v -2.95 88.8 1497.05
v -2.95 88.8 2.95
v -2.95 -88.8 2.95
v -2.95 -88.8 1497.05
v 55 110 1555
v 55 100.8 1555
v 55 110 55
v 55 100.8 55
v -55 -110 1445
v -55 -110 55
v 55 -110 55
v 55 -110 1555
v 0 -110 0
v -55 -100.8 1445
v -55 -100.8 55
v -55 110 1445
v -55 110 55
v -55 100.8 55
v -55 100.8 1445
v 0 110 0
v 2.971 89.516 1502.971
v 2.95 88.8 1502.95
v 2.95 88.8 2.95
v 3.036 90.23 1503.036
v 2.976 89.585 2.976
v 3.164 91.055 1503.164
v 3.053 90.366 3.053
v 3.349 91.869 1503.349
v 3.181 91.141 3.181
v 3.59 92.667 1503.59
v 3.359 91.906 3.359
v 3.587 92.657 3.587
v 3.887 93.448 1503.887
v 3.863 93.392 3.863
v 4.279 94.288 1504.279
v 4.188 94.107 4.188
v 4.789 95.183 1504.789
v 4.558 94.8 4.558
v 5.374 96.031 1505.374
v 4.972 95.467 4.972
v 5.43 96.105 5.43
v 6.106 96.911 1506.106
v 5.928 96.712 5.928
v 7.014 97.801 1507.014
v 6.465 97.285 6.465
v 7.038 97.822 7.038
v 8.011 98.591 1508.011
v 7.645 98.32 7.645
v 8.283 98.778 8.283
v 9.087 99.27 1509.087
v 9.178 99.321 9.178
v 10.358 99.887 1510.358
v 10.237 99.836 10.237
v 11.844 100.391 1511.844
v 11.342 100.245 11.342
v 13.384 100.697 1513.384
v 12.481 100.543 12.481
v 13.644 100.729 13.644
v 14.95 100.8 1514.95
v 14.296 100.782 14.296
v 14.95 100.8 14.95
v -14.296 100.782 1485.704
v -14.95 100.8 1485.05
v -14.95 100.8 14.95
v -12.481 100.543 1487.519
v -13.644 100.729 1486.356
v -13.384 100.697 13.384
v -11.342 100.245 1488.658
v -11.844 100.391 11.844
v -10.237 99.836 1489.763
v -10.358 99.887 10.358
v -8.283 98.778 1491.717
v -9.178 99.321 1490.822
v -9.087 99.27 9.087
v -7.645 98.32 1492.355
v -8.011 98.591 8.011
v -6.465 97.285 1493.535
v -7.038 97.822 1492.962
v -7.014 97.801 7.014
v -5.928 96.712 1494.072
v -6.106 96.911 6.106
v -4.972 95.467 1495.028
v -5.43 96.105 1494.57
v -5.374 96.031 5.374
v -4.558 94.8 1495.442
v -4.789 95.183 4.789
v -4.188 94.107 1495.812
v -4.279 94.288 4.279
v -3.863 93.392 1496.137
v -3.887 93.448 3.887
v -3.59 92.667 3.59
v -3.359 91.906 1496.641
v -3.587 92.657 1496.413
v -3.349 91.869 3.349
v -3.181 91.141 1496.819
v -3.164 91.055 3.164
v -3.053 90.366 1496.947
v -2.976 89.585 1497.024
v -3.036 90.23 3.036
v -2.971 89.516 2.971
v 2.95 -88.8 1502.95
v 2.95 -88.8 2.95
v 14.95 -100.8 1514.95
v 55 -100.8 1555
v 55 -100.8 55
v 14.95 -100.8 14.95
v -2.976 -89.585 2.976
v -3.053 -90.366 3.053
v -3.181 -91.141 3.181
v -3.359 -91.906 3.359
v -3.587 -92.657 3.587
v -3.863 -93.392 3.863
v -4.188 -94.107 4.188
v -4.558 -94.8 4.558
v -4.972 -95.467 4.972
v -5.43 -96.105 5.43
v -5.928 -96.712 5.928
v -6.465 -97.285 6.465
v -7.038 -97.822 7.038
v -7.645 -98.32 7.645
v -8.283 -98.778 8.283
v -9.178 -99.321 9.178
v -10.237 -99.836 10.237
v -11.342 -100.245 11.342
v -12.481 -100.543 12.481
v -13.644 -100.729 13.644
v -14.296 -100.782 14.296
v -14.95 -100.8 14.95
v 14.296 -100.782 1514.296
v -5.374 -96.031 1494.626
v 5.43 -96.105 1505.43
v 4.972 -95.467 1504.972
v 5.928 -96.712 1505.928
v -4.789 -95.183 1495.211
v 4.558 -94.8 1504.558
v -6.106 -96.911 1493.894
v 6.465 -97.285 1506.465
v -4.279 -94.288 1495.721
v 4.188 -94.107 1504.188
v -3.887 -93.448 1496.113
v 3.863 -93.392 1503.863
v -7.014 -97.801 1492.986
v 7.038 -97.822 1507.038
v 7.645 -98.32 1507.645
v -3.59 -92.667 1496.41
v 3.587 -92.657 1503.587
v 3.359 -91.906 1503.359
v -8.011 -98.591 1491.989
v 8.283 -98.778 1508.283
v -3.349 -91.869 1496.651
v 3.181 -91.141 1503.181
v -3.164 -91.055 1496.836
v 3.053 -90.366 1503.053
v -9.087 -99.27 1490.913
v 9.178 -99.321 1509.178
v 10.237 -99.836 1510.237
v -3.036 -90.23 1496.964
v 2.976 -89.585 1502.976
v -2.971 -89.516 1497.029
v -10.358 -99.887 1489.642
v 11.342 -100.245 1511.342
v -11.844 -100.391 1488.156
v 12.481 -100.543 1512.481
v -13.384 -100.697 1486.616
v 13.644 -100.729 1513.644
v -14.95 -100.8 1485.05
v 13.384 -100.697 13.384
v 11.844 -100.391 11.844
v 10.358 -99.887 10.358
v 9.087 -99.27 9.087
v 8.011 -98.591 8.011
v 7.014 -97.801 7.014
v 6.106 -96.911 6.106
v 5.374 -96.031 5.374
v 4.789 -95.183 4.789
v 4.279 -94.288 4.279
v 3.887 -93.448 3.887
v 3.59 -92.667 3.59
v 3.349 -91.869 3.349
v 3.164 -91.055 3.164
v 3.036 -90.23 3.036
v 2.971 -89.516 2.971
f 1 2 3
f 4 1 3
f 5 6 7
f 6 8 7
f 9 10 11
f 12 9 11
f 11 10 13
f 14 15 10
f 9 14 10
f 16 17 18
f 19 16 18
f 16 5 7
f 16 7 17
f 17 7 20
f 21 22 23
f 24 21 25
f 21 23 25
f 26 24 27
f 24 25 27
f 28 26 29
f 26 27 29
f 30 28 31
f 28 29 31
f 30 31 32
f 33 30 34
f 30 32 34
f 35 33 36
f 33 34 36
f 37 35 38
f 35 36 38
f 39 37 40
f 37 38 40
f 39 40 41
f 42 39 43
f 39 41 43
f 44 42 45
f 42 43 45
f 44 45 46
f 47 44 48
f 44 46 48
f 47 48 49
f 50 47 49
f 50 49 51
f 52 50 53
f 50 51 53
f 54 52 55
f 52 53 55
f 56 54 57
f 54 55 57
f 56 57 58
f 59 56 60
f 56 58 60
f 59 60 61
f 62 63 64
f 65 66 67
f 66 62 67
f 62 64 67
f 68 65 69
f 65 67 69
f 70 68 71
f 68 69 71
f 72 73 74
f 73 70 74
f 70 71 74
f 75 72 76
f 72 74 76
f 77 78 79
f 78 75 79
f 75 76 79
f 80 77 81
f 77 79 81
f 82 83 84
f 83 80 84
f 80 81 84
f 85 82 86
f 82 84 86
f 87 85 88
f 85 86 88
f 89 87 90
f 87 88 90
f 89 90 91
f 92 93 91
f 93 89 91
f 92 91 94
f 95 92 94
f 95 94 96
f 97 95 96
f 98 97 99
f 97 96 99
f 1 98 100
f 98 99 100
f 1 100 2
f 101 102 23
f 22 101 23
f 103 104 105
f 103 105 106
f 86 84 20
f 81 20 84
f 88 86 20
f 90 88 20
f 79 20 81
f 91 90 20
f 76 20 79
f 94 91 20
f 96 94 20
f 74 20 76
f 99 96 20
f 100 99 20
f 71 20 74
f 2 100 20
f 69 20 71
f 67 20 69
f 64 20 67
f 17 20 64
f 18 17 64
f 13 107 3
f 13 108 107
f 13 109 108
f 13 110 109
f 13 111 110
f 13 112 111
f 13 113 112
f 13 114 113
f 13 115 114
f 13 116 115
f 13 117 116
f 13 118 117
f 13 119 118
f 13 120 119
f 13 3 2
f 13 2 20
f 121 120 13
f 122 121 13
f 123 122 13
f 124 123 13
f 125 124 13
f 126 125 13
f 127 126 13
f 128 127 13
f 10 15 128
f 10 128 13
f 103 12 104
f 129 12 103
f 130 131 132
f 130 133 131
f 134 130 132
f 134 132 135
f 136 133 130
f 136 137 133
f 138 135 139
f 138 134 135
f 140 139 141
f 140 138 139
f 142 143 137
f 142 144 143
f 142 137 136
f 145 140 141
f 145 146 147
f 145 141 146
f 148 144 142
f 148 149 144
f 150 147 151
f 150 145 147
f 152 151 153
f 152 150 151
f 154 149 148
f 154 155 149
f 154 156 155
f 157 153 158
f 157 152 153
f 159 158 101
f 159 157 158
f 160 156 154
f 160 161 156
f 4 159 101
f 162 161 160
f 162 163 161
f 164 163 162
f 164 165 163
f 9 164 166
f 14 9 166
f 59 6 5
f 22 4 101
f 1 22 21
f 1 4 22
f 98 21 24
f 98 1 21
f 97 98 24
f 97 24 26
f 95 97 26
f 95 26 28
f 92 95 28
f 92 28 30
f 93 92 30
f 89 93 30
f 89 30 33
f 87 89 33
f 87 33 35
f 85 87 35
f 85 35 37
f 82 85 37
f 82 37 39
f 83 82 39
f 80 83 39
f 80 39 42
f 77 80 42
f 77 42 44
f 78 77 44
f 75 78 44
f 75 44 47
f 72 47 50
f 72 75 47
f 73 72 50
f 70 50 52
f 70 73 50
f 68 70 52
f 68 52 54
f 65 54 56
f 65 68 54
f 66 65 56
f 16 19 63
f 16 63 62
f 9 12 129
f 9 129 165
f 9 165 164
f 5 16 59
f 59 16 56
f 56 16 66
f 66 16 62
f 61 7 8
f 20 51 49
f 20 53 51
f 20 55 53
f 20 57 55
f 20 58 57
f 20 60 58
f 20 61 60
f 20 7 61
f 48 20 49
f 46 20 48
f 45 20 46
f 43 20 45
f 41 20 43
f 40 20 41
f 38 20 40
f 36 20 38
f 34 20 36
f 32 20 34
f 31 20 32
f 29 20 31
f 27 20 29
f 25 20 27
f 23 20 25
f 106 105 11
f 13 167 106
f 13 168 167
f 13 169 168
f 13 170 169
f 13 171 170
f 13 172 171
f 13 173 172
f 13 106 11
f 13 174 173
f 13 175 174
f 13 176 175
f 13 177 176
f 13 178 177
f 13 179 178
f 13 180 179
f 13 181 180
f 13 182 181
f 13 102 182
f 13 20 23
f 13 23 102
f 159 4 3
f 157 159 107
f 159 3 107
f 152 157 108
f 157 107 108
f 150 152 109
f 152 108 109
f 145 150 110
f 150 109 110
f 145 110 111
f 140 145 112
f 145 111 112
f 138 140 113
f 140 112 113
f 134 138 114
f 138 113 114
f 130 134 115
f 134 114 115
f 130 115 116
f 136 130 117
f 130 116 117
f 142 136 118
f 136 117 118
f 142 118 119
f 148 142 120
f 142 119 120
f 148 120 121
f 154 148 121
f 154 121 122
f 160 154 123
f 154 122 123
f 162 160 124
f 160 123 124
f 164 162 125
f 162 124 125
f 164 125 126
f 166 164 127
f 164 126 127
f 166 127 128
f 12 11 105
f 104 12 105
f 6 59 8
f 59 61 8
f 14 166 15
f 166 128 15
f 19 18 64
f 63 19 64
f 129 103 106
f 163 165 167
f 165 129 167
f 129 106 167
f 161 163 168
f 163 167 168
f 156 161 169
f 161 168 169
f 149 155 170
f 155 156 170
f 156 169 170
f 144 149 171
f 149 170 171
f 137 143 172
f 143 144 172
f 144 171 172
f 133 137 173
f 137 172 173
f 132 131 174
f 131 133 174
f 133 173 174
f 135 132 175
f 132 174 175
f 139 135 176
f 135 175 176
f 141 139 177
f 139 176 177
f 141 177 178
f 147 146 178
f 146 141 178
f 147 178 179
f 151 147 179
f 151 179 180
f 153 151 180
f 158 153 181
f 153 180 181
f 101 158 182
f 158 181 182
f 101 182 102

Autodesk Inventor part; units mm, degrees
ref_plane "Start plane" through (0, 0, 0) normal (0, 0, 1) x (1, 0, 0)
ref_plane "End plane" through (0, 0, 1555) normal (0, 0, 1) x (1, 0, 0)
sketch "Sketch2" plane through (0, 0, 0) normal (0, 0, 1) x (1, 0, 0)
  line L0 (-55, 100.8) -> (-14.95, 100.8)
  line L1 (-55, 110) -> (-55, 100.8)
  line L2 (55, 110) -> (-55, 110)
  line L3 (55, 100.8) -> (55, 110)
  line L4 (14.95, 100.8) -> (55, 100.8)
  line L5 (2.95, -88.8) -> (2.95, 88.8)
  line L6 (55, -100.8) -> (14.95, -100.8)
  line L7 (55, -110) -> (55, -100.8)
  line L8 (-55, -100.8) -> (-55, -110)
  line L9 (-14.95, -100.8) -> (-55, -100.8)
  line L10 (-2.95, 88.8) -> (-2.95, -88.8)
  line L11 (0, -154) -> (0, 154) construction
  line L12 (-2.95, -100.8) -> (2.95, -100.8) construction
  arc A0 (-14.95, -100.8) -> (-2.95, -88.8) centre (-14.95, -88.8) ccw
  arc A1 (-2.95, 88.8) -> (-14.95, 100.8) centre (-14.95, 88.8) ccw
  arc A2 (14.95, 100.8) -> (2.95, 88.8) centre (14.95, 88.8) ccw
  arc A3 (2.95, -88.8) -> (14.95, -100.8) centre (14.95, -88.8) ccw
  line L13 (-77, 0) -> (77, 0) construction
  line L14 (-55, -110) -> (55, -110)
  point P0 (-2.95, 100.8)
  point P1 (2.95, 100.8)
  point P2 (0, 0)
  point P3 (0, -100.8)
  point P4 (0, 0)
  dimension "d1" = 220
  dimension "d3" = 9.2
  dimension "d5" = 5.9
  dimension "d7" = 110
  dimension "d13" = 12
  dimension "d14" = 110
  dimension "d15" = 55
extrude "Body" add sketch "Sketch2" along normal up to surface (1555 mm away) from surface at 0
sketch "Sketch3" plane through (0, 0, 0) normal (0, 0, 1) x (1, 0, 0)
  line L0 (0, 0) -> (10, 0)
ref_plane "Work Plane3" through (0, 0, 0) normal (0, -1, 0) x (1, 0, 0)
ref_plane "Work Plane4" through (-55, 0, -55) normal (0.7071, 0, -0.7071) x (-0.7071, 0, -0.7071)
split "Split1" plane through (-55, 0, -55) removes the side toward (0.7071, 0, -0.7071)
ref_plane "Work Plane5" through (55, 0, -55) normal (-0.7071, 0, -0.7071) x (-0.7071, 0, 0.7071)
split "Split2" plane through (55, 0, -55) removes the side toward (-0.7071, 0, -0.7071)
ref_plane "Work Plane6" through (55, 0, 1555) normal (-0.7071, 0, 0.7071) x (0.7071, 0, 0.7071)
split "Split3" plane through (55, 0, 1555) removes the side toward (-0.7071, 0, 0.7071)
sketch "Sketch4" plane through (0, 0, 0) normal (0, -1, 0) x (1, 0, 0)
  line L0 (-2, 0) -> (12, 0) projected
  line L1 (-2, 1555) -> (12, 1555) projected
  dimension "d19" = 1555
equation "\"d1\" = ParH"
equation "\"d3\" = t2"
equation "\"d5\" = t1"
equation "\"d7\" = b"
equation "\"d13\" = R1"
equation "\"d14\" = 0.5 * d1"
equation "\"d15\" = 0.5 * d7"
equation "\"d8\" = G_L"
equation "\"b\" = 110"
equation "\"ParH\" = 220"
equation "\"R1\" = 12"
equation "\"G_L\" = d19"
equation "\"t1\" = 5.9"
equation "\"t2\" = 9.2"
equation "\"G_OFFSET_START\" = 0"
equation "\"G_OFFSET_END\" = 55"
equation "\"d17\" = G_OFFSET_END + B_L"
equation "\"B_L\" = 1500"
properties part number "DIN 1025 - IPE 220-1555" material "Steel, Mild"
